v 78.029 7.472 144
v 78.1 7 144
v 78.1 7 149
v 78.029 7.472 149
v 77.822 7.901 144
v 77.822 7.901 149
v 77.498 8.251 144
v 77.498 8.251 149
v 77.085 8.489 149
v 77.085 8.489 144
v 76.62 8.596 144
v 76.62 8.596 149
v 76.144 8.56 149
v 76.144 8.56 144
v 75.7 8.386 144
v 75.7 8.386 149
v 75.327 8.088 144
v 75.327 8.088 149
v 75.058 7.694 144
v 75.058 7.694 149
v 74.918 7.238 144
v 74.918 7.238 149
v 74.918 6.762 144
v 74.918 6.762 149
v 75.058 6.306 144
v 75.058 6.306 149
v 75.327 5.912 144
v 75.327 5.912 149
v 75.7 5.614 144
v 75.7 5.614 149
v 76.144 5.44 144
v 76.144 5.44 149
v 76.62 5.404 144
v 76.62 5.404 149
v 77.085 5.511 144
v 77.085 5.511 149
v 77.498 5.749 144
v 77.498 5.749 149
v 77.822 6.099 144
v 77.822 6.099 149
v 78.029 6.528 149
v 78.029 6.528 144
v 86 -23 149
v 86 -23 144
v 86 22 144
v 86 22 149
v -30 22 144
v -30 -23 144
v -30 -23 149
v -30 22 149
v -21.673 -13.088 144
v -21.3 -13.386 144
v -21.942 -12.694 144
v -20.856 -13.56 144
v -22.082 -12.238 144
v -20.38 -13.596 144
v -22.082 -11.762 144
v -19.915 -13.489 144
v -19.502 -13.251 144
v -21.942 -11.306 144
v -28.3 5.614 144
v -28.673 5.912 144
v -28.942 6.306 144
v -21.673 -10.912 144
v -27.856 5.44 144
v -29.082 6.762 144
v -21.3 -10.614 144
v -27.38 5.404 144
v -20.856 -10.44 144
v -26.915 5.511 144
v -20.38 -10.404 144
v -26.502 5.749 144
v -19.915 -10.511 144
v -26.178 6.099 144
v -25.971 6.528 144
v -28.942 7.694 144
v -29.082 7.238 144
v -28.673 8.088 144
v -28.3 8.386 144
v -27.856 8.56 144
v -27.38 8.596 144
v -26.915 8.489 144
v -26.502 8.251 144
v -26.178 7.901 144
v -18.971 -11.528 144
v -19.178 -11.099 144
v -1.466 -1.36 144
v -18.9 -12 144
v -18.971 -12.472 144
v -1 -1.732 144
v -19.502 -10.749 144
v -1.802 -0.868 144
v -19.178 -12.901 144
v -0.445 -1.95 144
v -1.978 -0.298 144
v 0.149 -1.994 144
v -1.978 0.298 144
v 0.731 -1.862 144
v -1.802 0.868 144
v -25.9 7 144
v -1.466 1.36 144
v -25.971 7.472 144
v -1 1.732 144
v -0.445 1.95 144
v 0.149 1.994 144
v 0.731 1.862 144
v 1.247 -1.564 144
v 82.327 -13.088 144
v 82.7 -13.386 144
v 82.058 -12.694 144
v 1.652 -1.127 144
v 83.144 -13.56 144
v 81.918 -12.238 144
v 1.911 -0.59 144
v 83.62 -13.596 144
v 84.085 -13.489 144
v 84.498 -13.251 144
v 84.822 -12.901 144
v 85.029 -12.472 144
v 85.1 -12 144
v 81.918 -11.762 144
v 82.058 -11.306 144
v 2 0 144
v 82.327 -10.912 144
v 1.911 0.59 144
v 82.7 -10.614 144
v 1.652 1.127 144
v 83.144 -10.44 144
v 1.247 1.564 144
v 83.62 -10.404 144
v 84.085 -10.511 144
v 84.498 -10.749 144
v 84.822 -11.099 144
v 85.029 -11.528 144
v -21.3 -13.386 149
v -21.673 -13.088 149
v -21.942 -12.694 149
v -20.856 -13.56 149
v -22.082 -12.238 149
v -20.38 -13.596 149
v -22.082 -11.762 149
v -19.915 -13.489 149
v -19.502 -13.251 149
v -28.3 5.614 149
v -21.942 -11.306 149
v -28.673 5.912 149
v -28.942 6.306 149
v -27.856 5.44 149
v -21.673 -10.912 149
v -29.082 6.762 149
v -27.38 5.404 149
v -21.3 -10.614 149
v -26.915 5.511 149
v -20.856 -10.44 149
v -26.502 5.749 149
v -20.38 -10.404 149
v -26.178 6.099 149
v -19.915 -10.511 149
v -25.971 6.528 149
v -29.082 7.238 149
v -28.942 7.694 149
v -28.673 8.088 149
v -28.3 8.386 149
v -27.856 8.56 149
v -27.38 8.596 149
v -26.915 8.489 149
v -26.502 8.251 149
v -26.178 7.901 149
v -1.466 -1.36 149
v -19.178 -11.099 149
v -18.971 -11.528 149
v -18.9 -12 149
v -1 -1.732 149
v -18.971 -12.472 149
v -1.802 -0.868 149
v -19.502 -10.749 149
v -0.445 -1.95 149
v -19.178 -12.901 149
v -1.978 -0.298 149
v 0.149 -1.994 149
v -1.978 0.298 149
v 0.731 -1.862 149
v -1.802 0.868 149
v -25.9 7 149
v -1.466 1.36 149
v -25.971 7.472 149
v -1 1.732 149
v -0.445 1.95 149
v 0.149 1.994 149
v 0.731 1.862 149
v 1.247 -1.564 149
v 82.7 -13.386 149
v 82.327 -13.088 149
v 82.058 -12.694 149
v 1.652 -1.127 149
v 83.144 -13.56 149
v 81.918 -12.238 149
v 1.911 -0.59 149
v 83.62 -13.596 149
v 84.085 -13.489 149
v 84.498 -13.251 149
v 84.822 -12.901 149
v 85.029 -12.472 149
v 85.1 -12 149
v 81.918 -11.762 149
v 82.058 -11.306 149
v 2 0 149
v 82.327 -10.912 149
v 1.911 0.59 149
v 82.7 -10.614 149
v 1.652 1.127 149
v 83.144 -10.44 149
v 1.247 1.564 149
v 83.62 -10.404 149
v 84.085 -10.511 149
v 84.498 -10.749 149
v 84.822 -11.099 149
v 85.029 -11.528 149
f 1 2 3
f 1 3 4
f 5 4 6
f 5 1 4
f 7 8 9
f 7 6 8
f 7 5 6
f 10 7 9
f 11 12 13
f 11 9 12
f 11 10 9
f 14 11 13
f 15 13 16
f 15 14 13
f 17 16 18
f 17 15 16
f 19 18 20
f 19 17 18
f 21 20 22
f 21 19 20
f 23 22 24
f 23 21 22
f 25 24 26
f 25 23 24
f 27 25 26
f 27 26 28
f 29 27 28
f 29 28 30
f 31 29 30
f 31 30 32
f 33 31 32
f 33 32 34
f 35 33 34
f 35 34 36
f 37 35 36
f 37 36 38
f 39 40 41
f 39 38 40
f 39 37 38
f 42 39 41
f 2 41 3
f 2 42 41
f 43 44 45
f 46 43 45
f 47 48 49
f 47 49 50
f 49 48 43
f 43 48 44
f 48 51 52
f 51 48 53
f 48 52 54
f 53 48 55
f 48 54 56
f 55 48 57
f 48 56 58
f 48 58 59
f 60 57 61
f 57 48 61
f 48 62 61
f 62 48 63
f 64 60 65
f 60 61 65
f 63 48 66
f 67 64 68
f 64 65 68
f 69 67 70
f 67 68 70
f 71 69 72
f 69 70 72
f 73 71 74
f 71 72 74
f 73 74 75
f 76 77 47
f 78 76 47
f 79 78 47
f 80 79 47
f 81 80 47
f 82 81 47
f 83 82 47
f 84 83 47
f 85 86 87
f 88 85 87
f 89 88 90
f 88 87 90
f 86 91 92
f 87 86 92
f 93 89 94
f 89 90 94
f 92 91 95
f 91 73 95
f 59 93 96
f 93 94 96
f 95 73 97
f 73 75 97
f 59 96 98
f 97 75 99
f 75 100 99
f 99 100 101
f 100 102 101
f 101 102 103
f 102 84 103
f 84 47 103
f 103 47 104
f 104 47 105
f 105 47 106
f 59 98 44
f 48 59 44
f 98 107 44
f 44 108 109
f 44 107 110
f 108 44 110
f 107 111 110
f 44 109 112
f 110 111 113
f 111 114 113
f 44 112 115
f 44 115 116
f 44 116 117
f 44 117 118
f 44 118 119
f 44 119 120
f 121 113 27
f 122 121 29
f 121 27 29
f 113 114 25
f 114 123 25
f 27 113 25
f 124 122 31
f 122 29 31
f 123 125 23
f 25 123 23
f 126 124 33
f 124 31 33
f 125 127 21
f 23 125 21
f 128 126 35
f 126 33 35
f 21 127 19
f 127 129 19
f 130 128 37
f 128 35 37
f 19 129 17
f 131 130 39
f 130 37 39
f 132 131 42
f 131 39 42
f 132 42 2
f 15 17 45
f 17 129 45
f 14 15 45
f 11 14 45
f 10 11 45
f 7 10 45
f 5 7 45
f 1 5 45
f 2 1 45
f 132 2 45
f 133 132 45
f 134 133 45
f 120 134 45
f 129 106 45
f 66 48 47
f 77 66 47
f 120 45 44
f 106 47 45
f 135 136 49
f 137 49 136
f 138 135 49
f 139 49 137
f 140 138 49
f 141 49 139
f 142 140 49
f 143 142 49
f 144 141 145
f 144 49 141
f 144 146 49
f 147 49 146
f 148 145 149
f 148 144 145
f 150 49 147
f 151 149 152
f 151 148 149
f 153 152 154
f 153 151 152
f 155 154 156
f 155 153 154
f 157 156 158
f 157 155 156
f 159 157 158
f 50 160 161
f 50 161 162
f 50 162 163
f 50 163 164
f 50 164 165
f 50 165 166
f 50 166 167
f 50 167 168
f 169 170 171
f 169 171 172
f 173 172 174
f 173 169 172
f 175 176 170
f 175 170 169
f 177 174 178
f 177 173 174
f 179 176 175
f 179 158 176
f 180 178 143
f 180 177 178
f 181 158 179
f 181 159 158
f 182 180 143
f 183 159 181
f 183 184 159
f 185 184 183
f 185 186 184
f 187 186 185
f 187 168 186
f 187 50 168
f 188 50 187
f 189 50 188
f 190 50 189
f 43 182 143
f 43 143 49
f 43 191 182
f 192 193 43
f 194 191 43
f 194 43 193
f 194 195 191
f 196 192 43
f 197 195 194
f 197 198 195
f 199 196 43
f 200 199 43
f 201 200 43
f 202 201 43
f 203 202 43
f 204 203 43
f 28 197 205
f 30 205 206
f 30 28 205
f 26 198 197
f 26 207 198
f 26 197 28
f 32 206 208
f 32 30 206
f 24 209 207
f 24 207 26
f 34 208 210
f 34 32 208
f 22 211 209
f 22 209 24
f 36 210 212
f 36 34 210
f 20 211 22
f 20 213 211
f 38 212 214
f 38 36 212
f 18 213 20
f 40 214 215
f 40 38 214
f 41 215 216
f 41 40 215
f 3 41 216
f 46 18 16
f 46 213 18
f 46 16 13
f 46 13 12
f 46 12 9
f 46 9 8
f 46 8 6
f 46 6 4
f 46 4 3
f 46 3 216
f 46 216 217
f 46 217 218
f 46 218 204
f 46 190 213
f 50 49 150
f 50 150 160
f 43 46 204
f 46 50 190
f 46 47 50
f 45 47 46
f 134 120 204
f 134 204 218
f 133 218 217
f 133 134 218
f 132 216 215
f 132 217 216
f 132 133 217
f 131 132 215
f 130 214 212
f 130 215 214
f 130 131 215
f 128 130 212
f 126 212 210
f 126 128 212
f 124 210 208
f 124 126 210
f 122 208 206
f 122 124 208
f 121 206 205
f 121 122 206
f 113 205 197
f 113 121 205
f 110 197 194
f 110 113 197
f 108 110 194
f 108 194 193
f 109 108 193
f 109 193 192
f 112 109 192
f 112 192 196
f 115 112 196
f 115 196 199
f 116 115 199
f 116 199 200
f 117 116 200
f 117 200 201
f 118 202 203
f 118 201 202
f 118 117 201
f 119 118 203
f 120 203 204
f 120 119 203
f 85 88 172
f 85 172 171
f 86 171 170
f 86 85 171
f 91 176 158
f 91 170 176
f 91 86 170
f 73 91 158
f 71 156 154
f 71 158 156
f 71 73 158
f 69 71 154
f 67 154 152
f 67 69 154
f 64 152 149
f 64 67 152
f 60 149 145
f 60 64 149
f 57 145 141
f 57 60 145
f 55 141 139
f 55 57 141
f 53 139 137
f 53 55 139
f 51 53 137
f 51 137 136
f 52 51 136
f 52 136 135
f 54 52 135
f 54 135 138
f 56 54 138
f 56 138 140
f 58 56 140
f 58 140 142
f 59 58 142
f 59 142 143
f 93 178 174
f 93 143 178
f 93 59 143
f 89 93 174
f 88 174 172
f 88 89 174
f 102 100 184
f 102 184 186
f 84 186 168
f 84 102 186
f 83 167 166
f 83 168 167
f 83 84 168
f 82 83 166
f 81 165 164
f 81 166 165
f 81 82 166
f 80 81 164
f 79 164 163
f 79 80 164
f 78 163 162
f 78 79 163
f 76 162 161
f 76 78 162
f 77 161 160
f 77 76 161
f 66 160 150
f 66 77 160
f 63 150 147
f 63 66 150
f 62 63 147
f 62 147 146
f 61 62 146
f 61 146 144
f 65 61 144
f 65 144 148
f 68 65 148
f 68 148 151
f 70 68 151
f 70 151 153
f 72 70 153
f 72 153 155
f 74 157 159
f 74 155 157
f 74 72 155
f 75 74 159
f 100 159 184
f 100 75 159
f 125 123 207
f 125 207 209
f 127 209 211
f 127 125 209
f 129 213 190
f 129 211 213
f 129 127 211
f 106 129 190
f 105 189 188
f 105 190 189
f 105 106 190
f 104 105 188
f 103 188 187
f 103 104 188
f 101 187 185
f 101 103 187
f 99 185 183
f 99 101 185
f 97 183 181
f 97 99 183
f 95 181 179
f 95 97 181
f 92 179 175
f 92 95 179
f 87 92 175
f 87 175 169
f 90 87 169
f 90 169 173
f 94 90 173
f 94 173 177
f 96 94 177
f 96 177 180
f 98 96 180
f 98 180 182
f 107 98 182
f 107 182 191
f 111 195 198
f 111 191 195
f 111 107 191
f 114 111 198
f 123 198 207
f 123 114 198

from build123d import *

# Parameters (mm, degrees)
CYLINDER093_R           = 2
CYLINDER093_DEPTH       = 30
CYLINDER019_R           = 1.6
CYLINDER019_DEPTH       = 40
CYLINDER019_PITCH_ANGLE = 90
CYLINDER018_R           = 1.6
CYLINDER018_DEPTH       = 40
CYLINDER018_PITCH_ANGLE = 90
CYLINDER017_R           = 1.6
CYLINDER017_DEPTH       = 40
CYLINDER016_R           = 1.6
CYLINDER016_DEPTH       = 70
CYLINDER016_ROLL_ANGLE  = 90
CYLINDER015_R           = 1.6
CYLINDER015_DEPTH       = 40
BOX013_W                = 116
BOX013_H                = 45
BOX013_DEPTH            = 5


with BuildPart() as cylinder371:
    # Cylinder093 → Cylinder093 (new body)
    with BuildSketch(Plane.XY.offset(128)):
        Circle(CYLINDER093_R)
    extrude(amount=CYLINDER093_DEPTH)


with BuildPart() as cylinder100:
    # Cylinder019 → Cylinder019 (new body)
    with BuildSketch(Plane.XY):
        Circle(CYLINDER019_R)
    extrude(amount=CYLINDER019_DEPTH)


with BuildPart() as cylinder100_1:
    # Cylinder019 pitch: moved
    add(cylinder100.part.rotate(Axis((0, 0, 0), (0, 1, 0)), CYLINDER019_PITCH_ANGLE))


with BuildPart() as cylinder100_2:
    # Cylinder019 placement: moved
    add(cylinder100_1.part.moved(Location((-40, 12, 9.5))))


with BuildPart() as fusion011:
    # Cylinder018 → Cylinder018 (new body)
    with BuildSketch(Plane.XY):
        Circle(CYLINDER018_R)
    extrude(amount=CYLINDER018_DEPTH)


with BuildPart() as fusion011_1:
    # Cylinder018 pitch: moved
    add(fusion011.part.rotate(Axis((0, 0, 0), (0, 1, 0)), CYLINDER018_PITCH_ANGLE))


with BuildPart() as fusion011_2:
    # Cylinder018 placement: moved
    add(fusion011_1.part.moved(Location((-40, -7, 2.5))))

    # Fusion011: union Cylinder100
    add(cylinder100_2.part)


with BuildPart() as fusion012:
    # Cylinder017 → Cylinder017 (new body)
    with BuildSketch(Plane(origin=(-27.5, 7, -15), x_dir=(1, 0, 0), z_dir=(0, 0, 1))):
        Circle(CYLINDER017_R)
    extrude(amount=CYLINDER017_DEPTH)

    # Fusion012: union Fusion011
    add(fusion011_2.part)


with BuildPart() as fusion013:
    # Cylinder016 → Cylinder016 (new body)
    with BuildSketch(Plane.XY):
        Circle(CYLINDER016_R)
    extrude(amount=CYLINDER016_DEPTH)


with BuildPart() as fusion013_1:
    # Cylinder016 roll: moved
    add(fusion013.part.rotate(Axis((0, 0, 0), (1, 0, 0)), CYLINDER016_ROLL_ANGLE))


with BuildPart() as fusion013_2:
    # Cylinder016 placement: moved
    add(fusion013_1.part.moved(Location((-24, 39, 6))))

    # Fusion013: union Fusion012
    add(fusion012.part)


with BuildPart() as cylinder008:
    # Cylinder015 → Cylinder015 (new body)
    with BuildSketch(Plane(origin=(-20.5, -12, -15), x_dir=(1, 0, 0), z_dir=(0, 0, 1))):
        Circle(CYLINDER015_R)
    extrude(amount=CYLINDER015_DEPTH)


with BuildPart() as face_corner_holes014:
    # Fusion028 base: copy of Cylinder008
    add(cylinder008.part)

    # Fusion028: union Fusion013
    add(fusion013_2.part)


with BuildPart() as face_corner_holes014_1:
    # Fusion028 placement: moved
    add(face_corner_holes014.part.moved(Location((104, 0, 132))))


with BuildPart() as face_corner_holes002:
    # Fusion016 base: copy of Cylinder008
    add(cylinder008.part)

    # Fusion016: union Fusion013
    add(fusion013_2.part)


with BuildPart() as face_corner_holes002_1:
    # Fusion016 placement: moved
    add(face_corner_holes002.part.moved(Location((0, 0, 132))))


with BuildPart() as right_a:
    # Box013 → Box013 (new body)
    with BuildSketch(Plane(origin=(-30, -23, 144), x_dir=(1, 0, 0), z_dir=(0, 0, 1))):
        with Locations((58, 22.5)):
            Rectangle(BOX013_W, BOX013_H)
    extrude(amount=BOX013_DEPTH)

    # Cut020: cut face-corner-holes002
    add(face_corner_holes002_1.part, mode=Mode.SUBTRACT)

    # Cut025: cut face-corner-holes014
    add(face_corner_holes014_1.part, mode=Mode.SUBTRACT)

    # Cut053: cut Cylinder371
    add(cylinder371.part, mode=Mode.SUBTRACT)


solid = right_a.part
